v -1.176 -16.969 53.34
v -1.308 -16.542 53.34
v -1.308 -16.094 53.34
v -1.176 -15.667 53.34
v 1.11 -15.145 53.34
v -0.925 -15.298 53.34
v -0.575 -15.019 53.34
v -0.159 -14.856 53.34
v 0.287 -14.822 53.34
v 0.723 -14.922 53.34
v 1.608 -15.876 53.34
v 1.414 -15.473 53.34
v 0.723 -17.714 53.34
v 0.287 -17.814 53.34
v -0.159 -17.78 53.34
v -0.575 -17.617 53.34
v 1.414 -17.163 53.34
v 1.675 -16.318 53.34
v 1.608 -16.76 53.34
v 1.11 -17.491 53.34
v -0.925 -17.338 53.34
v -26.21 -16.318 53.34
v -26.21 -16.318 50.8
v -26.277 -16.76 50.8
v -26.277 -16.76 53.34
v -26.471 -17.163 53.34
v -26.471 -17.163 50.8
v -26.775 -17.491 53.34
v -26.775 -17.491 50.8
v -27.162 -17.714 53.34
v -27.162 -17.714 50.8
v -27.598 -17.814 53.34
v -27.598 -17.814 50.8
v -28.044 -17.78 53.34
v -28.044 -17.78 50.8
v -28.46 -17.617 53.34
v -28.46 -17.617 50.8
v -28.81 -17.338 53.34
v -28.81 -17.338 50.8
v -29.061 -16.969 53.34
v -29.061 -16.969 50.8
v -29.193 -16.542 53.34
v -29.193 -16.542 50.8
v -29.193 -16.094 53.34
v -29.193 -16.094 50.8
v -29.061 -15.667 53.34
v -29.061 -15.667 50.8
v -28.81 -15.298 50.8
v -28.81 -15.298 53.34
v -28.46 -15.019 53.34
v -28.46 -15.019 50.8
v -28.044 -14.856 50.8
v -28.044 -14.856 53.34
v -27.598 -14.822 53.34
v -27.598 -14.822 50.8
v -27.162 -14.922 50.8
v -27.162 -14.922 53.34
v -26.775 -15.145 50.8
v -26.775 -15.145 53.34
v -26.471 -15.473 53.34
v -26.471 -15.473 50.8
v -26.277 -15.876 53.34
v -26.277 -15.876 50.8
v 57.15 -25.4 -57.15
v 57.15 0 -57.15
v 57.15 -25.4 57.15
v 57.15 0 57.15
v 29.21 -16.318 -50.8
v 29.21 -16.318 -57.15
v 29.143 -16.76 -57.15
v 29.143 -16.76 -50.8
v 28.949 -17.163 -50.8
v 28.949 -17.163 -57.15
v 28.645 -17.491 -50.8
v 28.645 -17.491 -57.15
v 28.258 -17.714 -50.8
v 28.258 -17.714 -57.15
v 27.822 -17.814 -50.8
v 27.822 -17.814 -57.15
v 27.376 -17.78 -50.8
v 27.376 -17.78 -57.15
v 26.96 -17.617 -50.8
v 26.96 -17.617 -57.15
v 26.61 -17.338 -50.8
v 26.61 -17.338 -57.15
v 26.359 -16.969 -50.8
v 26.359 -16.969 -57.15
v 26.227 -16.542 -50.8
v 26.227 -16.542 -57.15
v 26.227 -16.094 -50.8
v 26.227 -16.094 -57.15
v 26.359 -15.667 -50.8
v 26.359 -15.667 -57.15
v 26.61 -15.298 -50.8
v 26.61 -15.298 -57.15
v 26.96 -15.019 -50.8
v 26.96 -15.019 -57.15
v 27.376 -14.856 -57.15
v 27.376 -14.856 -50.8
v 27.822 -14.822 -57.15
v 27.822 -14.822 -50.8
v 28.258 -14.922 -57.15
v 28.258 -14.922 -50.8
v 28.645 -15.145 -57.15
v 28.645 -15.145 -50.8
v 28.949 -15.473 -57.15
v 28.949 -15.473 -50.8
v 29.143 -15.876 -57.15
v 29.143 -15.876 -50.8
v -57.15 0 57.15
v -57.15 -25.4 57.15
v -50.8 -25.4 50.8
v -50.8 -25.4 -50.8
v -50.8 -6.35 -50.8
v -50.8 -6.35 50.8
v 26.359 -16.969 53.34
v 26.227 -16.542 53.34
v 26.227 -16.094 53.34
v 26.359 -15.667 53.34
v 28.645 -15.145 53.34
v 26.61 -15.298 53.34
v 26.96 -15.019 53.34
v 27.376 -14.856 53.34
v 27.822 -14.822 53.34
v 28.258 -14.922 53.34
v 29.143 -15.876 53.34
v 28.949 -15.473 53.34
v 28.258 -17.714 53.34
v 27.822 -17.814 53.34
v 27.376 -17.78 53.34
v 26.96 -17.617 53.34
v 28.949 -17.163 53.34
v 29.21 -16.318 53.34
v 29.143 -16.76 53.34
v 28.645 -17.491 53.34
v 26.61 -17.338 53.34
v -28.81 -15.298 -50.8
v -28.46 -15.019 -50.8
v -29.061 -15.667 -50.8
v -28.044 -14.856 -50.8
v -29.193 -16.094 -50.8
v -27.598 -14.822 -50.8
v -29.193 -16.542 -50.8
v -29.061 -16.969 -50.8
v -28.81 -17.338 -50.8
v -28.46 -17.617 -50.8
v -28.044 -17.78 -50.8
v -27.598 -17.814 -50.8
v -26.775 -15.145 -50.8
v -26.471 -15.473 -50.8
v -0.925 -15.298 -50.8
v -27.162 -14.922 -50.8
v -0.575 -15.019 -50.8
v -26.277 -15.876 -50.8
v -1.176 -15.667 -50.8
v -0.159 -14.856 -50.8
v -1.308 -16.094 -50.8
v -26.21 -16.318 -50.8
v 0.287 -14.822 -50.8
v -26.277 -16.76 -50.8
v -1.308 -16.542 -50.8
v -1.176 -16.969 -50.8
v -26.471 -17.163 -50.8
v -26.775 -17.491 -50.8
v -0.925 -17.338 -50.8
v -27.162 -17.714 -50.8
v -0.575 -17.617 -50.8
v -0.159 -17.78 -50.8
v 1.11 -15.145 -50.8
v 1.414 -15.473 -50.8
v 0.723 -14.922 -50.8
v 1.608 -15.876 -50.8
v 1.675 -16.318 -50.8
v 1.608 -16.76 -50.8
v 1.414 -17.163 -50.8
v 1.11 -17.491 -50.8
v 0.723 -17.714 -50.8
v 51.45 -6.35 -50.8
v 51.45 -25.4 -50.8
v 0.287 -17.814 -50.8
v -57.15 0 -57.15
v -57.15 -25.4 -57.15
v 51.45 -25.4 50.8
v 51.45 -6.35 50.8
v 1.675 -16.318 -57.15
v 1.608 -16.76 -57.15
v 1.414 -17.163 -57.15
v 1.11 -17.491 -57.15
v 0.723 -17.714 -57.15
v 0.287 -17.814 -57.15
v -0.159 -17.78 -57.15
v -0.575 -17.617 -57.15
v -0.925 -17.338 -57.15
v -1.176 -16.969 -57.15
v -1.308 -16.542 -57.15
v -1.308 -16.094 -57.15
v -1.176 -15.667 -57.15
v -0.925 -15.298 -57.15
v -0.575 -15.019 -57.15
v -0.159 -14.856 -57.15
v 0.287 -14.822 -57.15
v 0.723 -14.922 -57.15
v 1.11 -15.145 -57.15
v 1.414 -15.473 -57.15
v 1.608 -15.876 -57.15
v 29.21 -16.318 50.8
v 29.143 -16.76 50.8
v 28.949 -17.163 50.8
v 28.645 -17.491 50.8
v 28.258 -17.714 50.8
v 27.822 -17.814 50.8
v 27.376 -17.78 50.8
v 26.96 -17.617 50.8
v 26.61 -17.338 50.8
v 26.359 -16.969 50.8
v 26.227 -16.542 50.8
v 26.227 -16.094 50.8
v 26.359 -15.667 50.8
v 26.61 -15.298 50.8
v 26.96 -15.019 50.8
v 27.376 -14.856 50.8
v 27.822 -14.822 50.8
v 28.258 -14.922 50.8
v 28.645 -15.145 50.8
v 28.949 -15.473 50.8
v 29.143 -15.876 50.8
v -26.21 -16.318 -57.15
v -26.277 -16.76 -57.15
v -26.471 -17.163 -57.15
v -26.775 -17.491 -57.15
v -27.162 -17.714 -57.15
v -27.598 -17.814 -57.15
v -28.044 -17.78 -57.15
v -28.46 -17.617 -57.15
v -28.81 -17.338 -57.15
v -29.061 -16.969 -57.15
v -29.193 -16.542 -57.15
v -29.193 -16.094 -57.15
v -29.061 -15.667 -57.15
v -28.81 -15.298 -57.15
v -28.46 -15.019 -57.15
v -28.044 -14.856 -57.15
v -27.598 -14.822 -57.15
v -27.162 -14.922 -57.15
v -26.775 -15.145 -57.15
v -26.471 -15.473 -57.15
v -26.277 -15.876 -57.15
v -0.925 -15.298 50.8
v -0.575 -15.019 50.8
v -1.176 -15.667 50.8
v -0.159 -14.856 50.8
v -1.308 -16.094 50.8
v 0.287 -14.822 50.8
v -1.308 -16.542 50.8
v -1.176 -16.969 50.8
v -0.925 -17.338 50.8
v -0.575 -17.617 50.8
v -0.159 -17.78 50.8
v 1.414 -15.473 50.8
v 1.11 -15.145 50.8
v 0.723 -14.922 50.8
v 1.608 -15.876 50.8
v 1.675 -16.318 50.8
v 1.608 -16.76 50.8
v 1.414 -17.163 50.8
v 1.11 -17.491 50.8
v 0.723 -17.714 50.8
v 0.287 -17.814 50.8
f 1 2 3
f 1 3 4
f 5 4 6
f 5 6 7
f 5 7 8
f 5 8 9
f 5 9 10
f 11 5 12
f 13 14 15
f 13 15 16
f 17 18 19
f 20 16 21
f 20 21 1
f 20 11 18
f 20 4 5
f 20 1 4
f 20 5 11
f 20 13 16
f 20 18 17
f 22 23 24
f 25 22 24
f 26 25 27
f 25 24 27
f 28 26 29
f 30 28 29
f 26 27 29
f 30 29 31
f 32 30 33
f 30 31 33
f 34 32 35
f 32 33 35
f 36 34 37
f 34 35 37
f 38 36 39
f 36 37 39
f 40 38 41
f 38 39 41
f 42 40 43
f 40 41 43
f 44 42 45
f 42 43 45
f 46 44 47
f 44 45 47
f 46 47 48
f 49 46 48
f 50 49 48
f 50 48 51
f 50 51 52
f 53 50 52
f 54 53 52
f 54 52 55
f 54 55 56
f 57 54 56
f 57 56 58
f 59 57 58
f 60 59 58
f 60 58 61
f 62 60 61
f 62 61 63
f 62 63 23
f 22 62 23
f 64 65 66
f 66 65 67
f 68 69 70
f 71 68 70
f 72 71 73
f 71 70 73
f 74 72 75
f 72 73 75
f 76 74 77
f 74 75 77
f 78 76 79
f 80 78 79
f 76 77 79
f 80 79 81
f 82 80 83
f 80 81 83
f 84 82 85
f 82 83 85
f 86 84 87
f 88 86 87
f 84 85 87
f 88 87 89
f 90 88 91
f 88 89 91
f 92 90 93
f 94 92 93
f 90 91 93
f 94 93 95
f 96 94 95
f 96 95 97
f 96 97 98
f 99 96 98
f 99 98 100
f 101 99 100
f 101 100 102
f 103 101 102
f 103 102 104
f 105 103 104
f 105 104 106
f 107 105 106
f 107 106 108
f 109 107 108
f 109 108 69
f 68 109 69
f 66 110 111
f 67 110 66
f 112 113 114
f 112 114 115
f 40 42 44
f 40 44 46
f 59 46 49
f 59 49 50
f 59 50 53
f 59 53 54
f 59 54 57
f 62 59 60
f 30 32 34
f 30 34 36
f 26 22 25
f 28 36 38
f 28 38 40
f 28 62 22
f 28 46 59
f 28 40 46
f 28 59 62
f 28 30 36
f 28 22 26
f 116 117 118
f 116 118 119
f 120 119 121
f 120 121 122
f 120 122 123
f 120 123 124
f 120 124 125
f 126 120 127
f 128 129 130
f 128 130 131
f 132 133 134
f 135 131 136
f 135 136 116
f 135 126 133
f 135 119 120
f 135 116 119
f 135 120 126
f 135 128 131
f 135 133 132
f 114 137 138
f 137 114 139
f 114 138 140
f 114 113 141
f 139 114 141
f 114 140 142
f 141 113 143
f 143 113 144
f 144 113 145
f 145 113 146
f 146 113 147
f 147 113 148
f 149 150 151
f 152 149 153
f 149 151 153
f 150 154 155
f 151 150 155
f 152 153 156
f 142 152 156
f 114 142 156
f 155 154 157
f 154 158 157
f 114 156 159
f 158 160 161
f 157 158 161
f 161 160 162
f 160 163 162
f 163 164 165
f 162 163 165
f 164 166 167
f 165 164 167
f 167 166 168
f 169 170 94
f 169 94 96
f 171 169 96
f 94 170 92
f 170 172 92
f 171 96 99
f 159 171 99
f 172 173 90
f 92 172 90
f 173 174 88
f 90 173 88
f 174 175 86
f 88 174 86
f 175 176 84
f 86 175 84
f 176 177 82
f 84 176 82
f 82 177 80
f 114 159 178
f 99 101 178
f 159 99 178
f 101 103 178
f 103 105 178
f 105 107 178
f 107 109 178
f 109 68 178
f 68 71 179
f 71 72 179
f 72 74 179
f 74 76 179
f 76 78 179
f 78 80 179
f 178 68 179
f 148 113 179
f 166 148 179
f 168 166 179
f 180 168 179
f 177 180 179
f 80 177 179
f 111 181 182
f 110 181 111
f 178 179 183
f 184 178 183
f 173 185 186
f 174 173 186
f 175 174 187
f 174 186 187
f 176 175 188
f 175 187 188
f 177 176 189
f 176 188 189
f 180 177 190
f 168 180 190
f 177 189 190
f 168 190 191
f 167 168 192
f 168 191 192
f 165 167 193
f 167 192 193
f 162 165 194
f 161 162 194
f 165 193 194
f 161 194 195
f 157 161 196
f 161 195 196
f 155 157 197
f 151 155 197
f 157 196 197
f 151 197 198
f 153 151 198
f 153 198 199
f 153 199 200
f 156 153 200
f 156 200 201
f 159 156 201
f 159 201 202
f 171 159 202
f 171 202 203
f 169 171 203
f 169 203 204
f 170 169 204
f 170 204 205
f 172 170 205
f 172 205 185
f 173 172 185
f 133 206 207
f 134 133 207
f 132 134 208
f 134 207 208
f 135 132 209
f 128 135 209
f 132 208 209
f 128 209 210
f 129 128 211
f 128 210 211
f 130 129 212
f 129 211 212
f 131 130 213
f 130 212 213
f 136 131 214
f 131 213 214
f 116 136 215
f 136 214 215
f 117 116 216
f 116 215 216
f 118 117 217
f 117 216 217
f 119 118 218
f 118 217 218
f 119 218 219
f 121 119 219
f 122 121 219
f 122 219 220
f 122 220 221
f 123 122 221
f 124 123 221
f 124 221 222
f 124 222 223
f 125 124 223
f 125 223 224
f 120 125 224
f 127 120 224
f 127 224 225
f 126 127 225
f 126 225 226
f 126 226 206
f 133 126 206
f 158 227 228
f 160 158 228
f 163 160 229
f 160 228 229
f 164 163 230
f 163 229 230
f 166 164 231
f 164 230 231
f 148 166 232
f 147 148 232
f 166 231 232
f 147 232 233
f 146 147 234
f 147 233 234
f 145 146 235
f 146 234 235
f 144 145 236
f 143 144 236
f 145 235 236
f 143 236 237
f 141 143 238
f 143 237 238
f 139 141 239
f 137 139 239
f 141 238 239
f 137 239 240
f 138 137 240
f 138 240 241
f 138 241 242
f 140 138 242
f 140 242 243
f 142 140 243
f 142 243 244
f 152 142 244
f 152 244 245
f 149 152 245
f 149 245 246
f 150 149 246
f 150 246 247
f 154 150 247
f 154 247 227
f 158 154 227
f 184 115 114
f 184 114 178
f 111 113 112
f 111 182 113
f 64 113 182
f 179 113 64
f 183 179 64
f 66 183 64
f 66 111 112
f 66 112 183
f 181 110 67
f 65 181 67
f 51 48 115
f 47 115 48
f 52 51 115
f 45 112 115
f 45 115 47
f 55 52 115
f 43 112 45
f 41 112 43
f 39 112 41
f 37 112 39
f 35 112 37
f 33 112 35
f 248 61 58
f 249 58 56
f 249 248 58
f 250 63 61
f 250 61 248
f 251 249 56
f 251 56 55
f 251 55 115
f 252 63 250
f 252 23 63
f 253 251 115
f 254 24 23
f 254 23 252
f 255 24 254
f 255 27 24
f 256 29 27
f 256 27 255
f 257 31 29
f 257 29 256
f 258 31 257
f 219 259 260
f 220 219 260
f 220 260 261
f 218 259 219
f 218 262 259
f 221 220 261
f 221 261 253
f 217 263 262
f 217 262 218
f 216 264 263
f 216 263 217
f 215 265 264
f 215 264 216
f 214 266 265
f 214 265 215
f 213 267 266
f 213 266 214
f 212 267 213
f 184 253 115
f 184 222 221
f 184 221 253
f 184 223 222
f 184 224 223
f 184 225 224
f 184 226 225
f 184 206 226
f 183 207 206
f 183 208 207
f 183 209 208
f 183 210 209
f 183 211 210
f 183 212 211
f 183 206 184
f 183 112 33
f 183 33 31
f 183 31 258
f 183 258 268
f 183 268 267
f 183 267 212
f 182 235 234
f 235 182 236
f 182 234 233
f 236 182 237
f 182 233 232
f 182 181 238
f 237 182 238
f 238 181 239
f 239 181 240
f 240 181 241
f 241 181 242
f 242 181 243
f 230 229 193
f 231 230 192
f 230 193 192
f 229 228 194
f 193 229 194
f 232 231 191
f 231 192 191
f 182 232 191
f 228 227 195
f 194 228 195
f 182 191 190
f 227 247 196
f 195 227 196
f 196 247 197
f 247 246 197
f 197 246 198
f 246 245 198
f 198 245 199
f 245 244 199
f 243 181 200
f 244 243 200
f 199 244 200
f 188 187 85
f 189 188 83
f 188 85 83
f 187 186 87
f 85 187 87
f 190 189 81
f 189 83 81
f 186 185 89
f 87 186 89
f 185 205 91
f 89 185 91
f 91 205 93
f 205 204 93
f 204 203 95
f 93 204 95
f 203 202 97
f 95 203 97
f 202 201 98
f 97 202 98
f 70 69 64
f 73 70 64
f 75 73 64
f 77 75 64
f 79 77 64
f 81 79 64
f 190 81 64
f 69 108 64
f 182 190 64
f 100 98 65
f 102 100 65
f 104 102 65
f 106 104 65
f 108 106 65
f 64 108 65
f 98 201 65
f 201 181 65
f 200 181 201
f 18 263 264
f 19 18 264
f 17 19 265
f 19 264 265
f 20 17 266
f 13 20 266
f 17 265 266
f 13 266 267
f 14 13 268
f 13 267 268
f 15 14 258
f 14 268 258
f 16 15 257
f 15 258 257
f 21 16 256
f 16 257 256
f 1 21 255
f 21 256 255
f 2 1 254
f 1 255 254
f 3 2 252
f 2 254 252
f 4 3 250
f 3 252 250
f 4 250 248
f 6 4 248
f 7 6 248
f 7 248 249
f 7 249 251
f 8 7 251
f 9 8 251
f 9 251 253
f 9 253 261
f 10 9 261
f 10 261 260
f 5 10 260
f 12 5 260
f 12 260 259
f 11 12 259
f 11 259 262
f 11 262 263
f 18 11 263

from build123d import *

# Parameters (mm, degrees)
F0_W     = 114.3
F0_H     = 114.3
F2_DEPTH = 25.4
F3_W     = 102.25038
F3_H     = 101.6
F4_DEPTH = 19.05
F5_R     = 1.5
F6_DEPTH = 110.49


with BuildPart() as f2:
    # F0 (on Front) → F2 (new body)
    with BuildSketch(Plane.XZ):
        Rectangle(F0_W, F0_H)
    extrude(amount=F2_DEPTH)

    # F3 (on face) → F4 (cut)
    with BuildSketch(Plane.XZ.offset(25.4)):
        with Locations((0.32519, 0)):
            Rectangle(F3_W, F3_H)
    extrude(amount=-F4_DEPTH, mode=Mode.SUBTRACT)

    # F5 (on face) → F6 (cut)
    with BuildSketch(Plane(origin=(0, 0, -57.15), x_dir=(1, 0, 0), z_dir=(0, 0, -1))):
        with Locations((0.175, 16.318)):
            Circle(F5_R)
        with Locations((27.71, 16.318)):
            Circle(F5_R)
        with Locations((-27.71, 16.318)):
            Circle(F5_R)
    extrude(amount=-F6_DEPTH, mode=Mode.SUBTRACT)


solid = f2.part
